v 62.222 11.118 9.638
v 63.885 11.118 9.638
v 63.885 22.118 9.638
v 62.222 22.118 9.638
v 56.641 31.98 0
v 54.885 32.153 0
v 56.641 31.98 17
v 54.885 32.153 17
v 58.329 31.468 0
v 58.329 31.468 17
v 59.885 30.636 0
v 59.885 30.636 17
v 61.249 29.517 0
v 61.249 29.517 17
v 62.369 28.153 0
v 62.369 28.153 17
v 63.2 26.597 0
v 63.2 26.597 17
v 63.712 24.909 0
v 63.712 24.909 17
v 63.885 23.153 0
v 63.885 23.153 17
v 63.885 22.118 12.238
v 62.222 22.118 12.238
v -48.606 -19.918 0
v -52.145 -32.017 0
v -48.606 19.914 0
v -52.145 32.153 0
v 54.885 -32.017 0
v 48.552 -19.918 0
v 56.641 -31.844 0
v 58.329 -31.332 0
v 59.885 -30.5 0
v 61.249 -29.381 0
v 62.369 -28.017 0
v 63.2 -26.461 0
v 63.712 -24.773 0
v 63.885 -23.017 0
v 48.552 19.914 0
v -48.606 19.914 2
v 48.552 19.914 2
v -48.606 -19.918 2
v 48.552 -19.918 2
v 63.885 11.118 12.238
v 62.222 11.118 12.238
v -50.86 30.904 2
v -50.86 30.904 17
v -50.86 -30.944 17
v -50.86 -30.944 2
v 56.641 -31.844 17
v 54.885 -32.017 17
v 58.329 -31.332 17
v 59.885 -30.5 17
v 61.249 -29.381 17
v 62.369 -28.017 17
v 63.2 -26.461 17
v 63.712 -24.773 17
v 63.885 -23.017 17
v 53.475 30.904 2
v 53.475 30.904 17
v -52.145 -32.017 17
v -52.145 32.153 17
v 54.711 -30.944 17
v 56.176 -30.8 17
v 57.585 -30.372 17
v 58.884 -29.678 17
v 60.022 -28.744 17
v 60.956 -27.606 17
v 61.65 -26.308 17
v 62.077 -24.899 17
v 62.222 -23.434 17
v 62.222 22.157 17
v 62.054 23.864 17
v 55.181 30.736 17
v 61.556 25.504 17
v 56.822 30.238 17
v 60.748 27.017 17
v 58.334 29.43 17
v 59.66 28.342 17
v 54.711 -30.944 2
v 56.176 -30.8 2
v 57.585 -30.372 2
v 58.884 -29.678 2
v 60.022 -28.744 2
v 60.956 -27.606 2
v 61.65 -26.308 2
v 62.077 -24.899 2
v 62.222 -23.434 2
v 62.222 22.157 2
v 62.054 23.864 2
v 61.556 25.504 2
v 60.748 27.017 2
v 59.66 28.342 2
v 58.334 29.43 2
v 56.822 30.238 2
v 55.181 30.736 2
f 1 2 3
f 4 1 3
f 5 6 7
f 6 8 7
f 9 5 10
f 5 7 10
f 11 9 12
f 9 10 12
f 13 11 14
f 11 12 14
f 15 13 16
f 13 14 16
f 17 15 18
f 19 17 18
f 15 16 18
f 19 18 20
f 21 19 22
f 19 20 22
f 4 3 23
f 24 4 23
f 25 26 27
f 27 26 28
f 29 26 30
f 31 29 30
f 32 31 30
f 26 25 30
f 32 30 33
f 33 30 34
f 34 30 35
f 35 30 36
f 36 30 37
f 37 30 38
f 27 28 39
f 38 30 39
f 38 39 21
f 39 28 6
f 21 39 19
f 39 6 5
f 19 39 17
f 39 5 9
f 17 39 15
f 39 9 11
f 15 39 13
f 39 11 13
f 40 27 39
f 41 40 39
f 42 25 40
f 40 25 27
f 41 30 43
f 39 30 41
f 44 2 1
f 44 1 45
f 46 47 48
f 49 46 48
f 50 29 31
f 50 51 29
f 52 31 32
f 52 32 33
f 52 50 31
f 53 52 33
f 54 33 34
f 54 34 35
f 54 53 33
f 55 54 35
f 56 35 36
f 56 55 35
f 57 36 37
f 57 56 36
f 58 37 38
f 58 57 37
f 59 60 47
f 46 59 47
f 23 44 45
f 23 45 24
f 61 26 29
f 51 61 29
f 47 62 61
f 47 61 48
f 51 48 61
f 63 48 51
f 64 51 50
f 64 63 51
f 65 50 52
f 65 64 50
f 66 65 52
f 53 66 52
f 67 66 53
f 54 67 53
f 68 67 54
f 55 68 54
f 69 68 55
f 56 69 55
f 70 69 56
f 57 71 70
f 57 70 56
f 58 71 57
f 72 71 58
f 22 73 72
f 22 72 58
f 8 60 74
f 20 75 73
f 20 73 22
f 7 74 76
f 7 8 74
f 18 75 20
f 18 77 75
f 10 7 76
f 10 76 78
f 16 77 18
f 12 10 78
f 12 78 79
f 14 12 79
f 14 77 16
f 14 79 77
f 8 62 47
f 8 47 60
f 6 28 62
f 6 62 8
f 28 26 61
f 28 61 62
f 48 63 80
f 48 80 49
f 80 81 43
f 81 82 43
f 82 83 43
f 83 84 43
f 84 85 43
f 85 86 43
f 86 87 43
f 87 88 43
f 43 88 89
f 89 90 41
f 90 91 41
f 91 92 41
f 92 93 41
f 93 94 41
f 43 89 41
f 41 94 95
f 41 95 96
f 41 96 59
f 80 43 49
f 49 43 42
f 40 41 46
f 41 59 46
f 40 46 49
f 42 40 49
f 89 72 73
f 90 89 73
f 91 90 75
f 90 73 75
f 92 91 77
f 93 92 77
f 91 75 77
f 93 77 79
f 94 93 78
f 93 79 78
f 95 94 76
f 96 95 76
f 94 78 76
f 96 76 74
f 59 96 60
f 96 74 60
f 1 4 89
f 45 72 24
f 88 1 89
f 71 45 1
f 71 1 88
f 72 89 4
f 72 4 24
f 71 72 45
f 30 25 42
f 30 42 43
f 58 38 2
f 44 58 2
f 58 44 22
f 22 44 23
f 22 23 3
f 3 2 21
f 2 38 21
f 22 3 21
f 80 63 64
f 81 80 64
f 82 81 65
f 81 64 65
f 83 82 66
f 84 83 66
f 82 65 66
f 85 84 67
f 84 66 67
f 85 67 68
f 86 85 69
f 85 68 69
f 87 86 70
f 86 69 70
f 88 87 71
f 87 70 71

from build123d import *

# Parameters (mm, degrees)
SKETCH014_W        = 116.03
SKETCH014_H        = 64.17
SKETCH014_W_2      = 97.158283
SKETCH014_H_2      = 39.832356
EXTRUDE002_DEPTH   = 17
POCKET005004_DEPTH = 15
FILLET_R           = 9
SKETCH018_W        = 11
SKETCH018_H        = 2.6
POCKET005005_DEPTH = 5


with BuildPart() as part:
    # Sketch014 → Extrude002 (new body)
    with BuildSketch(Plane.XY):
        with Locations((5.870297, 0.068238)):
            Rectangle(SKETCH014_W, SKETCH014_H)
        with Locations((-0.027307, -0.001692)):
            Rectangle(SKETCH014_W_2, SKETCH014_H_2, mode=Mode.SUBTRACT)
    extrude(amount=EXTRUDE002_DEPTH)

    # Sketch017 (on Face10 of Extrude002) → Pocket005004 (cut)
    with BuildSketch(Plane.XY.offset(17)):
        with BuildLine():
            Line((-41.973666, 30.903742), (53.475128, 30.903742))
            ThreePointArc((62.221588, 22.157282), (59.659809, 28.341963), (53.475128, 30.903742))
            Line((62.221588, 22.157282), (62.221588, -23.433549))
            ThreePointArc((54.711295, -30.943842), (60.021874, -28.744128), (62.221588, -23.433549))
            Line((54.711295, -30.943842), (-43.311095, -30.943842))
            Line((-43.311095, -30.943842), (-50.860429, -30.943842))
            Line((-50.860429, -30.943842), (-50.860429, -23.394508))
            Line((-50.860429, -23.394508), (-50.860429, 22.016979))
            Line((-50.860429, 30.903742), (-50.860429, 22.016979))
            Line((-41.973666, 30.903742), (-50.860429, 30.903742))
        make_face()
    extrude(amount=-POCKET005004_DEPTH, mode=Mode.SUBTRACT)

    # Fillet
    fillet_edges = [part.edges().sort_by_distance(p)[0] for p in [
        (63.885297, 32.153238, 8.5),
        (63.885297, -32.016762, 8.5),
    ]]
    fillet(fillet_edges, radius=FILLET_R)

    # Sketch018 (on Face6 of Fillet) → Pocket005005 (cut)
    with BuildSketch(Plane.YZ.offset(63.885297)):
        with Locations((16.617887, 10.937535)):
            Rectangle(SKETCH018_W, SKETCH018_H)
    extrude(amount=-POCKET005005_DEPTH, mode=Mode.SUBTRACT)


solid = part.part
